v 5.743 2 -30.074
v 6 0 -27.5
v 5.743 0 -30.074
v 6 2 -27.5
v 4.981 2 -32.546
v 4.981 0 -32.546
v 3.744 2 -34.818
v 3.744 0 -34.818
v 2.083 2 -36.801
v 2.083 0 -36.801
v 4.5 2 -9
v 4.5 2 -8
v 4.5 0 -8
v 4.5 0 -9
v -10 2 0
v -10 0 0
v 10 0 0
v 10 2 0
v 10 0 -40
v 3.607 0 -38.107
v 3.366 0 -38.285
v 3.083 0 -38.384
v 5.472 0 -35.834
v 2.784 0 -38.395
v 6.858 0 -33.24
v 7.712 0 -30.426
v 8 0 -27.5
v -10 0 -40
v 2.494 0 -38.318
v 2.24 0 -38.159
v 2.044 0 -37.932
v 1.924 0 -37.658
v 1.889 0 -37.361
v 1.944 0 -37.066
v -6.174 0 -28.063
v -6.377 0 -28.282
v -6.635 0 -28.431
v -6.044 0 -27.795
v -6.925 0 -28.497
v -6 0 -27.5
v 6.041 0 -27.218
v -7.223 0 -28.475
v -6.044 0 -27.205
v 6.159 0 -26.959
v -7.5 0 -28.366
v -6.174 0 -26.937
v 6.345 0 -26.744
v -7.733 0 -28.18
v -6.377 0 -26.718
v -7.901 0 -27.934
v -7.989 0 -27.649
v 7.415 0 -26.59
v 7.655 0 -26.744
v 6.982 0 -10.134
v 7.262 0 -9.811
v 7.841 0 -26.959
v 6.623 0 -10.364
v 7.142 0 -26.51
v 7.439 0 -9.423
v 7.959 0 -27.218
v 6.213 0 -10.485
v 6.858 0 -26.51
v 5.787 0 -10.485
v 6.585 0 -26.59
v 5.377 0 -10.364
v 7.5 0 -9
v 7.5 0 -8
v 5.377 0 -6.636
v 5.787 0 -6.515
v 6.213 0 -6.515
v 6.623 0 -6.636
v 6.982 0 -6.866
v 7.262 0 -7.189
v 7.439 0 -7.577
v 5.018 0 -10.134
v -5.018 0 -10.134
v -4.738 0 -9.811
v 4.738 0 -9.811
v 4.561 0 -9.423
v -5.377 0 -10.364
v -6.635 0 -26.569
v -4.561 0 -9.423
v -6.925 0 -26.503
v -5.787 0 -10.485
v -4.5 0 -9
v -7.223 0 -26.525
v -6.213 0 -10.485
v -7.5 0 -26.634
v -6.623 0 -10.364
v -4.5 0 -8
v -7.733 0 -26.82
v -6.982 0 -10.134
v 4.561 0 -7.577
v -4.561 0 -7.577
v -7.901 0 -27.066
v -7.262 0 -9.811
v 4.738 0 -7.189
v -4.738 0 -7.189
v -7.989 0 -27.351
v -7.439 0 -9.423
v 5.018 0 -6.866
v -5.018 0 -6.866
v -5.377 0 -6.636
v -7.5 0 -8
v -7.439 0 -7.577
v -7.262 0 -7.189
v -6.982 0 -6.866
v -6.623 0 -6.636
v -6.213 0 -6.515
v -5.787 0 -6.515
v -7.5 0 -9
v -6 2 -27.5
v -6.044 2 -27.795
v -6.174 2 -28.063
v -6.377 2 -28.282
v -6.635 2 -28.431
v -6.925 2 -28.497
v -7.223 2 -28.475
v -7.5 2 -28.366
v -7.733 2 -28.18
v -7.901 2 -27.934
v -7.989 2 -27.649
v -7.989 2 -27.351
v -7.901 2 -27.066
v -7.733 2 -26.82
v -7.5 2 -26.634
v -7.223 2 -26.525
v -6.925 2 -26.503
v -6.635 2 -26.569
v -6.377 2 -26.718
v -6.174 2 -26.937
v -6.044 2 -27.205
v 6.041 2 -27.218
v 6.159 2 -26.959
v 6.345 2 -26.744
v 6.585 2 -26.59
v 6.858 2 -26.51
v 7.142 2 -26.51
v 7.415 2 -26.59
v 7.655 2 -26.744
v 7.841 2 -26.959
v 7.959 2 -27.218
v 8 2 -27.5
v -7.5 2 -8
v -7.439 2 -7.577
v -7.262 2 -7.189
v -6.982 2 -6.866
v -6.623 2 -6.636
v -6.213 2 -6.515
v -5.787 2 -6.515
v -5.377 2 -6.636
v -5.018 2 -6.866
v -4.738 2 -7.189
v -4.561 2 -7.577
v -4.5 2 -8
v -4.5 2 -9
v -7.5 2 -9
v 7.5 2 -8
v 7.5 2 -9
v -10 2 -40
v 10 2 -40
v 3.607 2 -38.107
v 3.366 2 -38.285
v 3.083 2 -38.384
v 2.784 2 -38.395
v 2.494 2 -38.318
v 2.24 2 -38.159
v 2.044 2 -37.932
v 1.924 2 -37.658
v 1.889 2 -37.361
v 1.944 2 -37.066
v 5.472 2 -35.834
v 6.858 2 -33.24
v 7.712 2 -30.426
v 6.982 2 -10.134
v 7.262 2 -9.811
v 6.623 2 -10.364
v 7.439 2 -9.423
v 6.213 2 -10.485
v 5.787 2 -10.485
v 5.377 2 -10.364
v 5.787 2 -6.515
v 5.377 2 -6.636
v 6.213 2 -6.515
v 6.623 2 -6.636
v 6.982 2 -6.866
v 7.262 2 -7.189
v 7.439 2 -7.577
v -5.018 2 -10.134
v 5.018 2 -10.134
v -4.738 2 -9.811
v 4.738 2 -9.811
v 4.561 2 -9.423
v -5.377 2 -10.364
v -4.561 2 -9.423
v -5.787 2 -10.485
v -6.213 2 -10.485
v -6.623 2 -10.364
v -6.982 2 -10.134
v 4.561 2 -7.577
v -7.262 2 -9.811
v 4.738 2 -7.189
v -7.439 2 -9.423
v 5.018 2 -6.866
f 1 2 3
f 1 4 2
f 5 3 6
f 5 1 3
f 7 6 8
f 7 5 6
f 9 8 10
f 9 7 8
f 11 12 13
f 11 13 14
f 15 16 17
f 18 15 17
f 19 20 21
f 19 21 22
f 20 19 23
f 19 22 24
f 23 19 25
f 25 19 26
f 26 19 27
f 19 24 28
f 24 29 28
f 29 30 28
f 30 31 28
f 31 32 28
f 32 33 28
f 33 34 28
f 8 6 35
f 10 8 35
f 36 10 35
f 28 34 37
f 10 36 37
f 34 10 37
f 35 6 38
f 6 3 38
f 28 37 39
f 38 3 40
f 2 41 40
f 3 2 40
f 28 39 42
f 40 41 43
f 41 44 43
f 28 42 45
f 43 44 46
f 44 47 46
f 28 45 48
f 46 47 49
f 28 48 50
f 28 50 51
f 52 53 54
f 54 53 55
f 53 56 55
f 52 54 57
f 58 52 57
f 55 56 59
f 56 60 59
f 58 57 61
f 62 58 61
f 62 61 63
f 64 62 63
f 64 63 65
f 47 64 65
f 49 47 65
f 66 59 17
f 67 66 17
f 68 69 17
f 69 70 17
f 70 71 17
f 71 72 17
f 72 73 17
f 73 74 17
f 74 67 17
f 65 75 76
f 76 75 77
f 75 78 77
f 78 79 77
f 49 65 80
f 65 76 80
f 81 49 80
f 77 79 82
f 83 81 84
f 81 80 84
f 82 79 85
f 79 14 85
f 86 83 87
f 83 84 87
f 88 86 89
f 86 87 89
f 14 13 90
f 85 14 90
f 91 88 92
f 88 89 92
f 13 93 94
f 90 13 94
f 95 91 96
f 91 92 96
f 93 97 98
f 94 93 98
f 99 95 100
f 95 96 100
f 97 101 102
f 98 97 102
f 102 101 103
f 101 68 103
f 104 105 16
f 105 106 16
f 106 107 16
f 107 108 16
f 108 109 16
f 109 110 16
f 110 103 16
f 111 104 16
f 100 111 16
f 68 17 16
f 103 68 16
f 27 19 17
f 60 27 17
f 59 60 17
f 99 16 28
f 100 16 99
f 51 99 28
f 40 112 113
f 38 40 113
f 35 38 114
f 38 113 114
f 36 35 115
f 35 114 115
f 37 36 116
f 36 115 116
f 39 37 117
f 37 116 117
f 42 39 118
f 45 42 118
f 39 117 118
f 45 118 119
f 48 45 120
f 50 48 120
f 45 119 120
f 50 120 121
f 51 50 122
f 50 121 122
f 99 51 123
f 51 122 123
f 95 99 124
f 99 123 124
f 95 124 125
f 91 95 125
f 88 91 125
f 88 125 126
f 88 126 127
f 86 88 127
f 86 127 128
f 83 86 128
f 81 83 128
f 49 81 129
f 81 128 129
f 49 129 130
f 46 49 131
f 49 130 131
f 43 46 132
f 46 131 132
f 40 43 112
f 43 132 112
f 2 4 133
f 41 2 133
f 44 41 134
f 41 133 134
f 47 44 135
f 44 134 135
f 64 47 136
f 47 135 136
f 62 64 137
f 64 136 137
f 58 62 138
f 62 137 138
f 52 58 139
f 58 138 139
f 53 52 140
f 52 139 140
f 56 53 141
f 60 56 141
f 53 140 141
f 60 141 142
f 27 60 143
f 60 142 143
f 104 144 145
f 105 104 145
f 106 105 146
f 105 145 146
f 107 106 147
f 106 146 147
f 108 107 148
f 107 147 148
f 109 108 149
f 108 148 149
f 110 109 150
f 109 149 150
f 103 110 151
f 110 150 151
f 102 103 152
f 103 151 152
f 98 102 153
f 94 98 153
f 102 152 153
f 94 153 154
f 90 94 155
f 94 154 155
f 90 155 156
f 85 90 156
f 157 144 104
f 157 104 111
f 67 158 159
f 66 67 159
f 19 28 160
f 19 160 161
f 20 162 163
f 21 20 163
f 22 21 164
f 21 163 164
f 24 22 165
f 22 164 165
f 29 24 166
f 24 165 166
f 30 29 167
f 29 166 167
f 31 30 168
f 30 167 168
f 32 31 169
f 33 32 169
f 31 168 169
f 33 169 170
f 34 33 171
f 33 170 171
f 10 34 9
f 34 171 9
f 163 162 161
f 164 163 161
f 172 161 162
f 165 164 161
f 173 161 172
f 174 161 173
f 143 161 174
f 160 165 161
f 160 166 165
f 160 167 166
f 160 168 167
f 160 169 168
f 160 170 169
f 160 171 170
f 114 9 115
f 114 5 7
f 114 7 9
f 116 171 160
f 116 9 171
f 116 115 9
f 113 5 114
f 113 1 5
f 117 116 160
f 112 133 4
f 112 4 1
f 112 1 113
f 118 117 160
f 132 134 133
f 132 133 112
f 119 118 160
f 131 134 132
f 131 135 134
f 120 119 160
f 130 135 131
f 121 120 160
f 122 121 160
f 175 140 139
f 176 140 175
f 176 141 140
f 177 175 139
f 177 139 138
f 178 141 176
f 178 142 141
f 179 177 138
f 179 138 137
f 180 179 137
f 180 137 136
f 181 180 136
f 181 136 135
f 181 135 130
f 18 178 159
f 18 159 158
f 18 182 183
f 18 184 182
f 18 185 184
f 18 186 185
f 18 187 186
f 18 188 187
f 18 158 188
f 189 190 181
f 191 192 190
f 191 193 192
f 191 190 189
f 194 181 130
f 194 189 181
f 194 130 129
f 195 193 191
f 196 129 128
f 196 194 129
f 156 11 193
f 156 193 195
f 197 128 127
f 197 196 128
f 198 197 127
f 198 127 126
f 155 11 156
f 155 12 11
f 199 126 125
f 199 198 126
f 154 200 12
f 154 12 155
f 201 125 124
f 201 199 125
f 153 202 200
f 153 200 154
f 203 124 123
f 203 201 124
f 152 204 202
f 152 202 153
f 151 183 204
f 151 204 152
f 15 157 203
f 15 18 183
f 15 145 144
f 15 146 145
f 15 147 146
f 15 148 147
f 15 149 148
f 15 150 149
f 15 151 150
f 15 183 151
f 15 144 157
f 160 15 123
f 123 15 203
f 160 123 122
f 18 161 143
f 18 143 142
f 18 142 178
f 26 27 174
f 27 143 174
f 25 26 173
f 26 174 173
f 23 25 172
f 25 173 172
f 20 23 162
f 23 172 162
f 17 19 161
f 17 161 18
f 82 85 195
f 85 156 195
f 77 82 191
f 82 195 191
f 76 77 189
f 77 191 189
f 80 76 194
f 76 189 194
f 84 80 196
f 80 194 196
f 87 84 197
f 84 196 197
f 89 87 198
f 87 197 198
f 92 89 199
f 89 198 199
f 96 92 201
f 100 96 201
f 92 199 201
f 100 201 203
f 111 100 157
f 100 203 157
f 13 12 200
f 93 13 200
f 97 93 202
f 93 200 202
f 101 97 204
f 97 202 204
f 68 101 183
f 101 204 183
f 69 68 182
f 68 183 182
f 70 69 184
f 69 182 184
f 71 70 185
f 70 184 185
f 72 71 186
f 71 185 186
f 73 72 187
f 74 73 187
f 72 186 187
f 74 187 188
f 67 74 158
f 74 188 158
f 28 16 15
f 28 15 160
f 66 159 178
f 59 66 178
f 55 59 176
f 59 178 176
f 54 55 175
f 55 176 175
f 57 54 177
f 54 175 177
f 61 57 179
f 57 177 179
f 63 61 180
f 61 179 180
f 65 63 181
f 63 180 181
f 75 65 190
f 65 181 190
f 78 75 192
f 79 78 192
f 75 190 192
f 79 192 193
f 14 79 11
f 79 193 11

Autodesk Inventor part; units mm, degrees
ref_plane "YZ Plane" through (0, 0, 0) normal (1, 0, 0) x (0, 1, 0)
ref_plane "XZ Plane" through (0, 0, 0) normal (0, 1, 0) x (-1, 0, 0)
ref_plane "XY Plane" through (0, 0, 0) normal (0, 0, 1) x (1, 0, 0)
sketch "Sketch1" plane through (0, 0, 0) normal (0, 1, 0) x (-1, 0, 0)
  line L0 (14, 0) -> (-14, 0) projected
  line L1 (0, -48) -> (0, 8) projected
  line L2 (10, -40) -> (-10, -40)
  line L3 (-10, -40) -> (-10, 0)
  line L4 (-10, 0) -> (10, 0)
  line L5 (10, 0) -> (10, -40)
  point P0 (0, 0)
  dimension "d0" = 20
  dimension "d1" = 40
  dimension "d4" = 10
extrude "Extrusion1" add sketch "Sketch1" along normal blind 2
sketch "Sketch2" plane through (0, 2, 0) normal (0, 1, 0) x (1, 0, 0)
  line L0 (10, 40) -> (-10, 40) projected
  line L1 (-10, 40) -> (-10, 0) projected
  line L2 (-10, 0) -> (10, 0) projected
  line L3 (10, 0) -> (10, 40) projected
  line L4 (10, 13.5) -> (-10, 13.5) construction
  line L5 (-10, 13.5) -> (-10, 24.5) construction
  line L6 (-10, 24.5) -> (10, 24.5) construction
  line L7 (10, 24.5) -> (10, 13.5) construction
  line L8 (10, 0) -> (10, 40) projected
  arc A0 (4.5, 8) -> (7.5, 8) centre (6, 8) ccw
  arc A1 (-7.5, 8) -> (-4.5, 8) centre (-6, 8) ccw
  line L9 (0, 49.0401) -> (0, -8.1733) construction
  arc A2 (7.5, 9) -> (4.5, 9) centre (6, 9) ccw
  arc A3 (-4.5, 9) -> (-7.5, 9) centre (-6, 9) ccw
  line L10 (7.5, 8) -> (7.5, 9)
  line L11 (4.5, 8) -> (4.5, 9)
  line L12 (-4.5, 8) -> (-4.5, 9)
  line L13 (-7.5, 8) -> (-7.5, 9)
  circle A4 centre (-7, 27.5) radius 1
  line L14 (-7, 27.5) -> (15.2836, 27.5) construction
  line L15 (-7, 27.5) -> (11.3667, 45.8667) construction
  arc A5 (3.6066, 38.1066) -> (2.1834, 36.6834) centre (2.895, 37.395) ccw
  arc A6 (6, 27.5) -> (8, 27.5) centre (7, 27.5) ccw
  arc A7 (6, 27.5) -> (2.0828, 36.8006) centre (-7, 27.5) ccw
  arc A8 (8, 27.5) -> (3.6066, 38.1066) centre (-7, 27.5) ccw
  point P0 (0, 0)
  dimension "d6" = 11
  dimension "d8" = 3
  dimension "d9" = 3
  dimension "d10" = 8
  dimension "d11" = 8
  dimension "d12" = 6
  dimension "d13" = 6
  dimension "d14" = 3
  dimension "d15" = 3
  dimension "d16" = 4.5
  dimension "d17" = 2
  dimension "d18" = 3
  dimension "d19" = 3
  dimension "d22" = 45
extrude "Extrusion2" cut sketch "Sketch2" against normal blind 3 contours L11 A2 L10 A0 | L13 A3 L12 A1 | A4 | A8 A6 A7 A5
equation "\"d4\" = 0.5 * d0"
equation "\"d11\" = d10"
equation "\"d13\" = d12"
equation "\"d23\" = d15"
properties part number "BallBalancing_Hinge"
